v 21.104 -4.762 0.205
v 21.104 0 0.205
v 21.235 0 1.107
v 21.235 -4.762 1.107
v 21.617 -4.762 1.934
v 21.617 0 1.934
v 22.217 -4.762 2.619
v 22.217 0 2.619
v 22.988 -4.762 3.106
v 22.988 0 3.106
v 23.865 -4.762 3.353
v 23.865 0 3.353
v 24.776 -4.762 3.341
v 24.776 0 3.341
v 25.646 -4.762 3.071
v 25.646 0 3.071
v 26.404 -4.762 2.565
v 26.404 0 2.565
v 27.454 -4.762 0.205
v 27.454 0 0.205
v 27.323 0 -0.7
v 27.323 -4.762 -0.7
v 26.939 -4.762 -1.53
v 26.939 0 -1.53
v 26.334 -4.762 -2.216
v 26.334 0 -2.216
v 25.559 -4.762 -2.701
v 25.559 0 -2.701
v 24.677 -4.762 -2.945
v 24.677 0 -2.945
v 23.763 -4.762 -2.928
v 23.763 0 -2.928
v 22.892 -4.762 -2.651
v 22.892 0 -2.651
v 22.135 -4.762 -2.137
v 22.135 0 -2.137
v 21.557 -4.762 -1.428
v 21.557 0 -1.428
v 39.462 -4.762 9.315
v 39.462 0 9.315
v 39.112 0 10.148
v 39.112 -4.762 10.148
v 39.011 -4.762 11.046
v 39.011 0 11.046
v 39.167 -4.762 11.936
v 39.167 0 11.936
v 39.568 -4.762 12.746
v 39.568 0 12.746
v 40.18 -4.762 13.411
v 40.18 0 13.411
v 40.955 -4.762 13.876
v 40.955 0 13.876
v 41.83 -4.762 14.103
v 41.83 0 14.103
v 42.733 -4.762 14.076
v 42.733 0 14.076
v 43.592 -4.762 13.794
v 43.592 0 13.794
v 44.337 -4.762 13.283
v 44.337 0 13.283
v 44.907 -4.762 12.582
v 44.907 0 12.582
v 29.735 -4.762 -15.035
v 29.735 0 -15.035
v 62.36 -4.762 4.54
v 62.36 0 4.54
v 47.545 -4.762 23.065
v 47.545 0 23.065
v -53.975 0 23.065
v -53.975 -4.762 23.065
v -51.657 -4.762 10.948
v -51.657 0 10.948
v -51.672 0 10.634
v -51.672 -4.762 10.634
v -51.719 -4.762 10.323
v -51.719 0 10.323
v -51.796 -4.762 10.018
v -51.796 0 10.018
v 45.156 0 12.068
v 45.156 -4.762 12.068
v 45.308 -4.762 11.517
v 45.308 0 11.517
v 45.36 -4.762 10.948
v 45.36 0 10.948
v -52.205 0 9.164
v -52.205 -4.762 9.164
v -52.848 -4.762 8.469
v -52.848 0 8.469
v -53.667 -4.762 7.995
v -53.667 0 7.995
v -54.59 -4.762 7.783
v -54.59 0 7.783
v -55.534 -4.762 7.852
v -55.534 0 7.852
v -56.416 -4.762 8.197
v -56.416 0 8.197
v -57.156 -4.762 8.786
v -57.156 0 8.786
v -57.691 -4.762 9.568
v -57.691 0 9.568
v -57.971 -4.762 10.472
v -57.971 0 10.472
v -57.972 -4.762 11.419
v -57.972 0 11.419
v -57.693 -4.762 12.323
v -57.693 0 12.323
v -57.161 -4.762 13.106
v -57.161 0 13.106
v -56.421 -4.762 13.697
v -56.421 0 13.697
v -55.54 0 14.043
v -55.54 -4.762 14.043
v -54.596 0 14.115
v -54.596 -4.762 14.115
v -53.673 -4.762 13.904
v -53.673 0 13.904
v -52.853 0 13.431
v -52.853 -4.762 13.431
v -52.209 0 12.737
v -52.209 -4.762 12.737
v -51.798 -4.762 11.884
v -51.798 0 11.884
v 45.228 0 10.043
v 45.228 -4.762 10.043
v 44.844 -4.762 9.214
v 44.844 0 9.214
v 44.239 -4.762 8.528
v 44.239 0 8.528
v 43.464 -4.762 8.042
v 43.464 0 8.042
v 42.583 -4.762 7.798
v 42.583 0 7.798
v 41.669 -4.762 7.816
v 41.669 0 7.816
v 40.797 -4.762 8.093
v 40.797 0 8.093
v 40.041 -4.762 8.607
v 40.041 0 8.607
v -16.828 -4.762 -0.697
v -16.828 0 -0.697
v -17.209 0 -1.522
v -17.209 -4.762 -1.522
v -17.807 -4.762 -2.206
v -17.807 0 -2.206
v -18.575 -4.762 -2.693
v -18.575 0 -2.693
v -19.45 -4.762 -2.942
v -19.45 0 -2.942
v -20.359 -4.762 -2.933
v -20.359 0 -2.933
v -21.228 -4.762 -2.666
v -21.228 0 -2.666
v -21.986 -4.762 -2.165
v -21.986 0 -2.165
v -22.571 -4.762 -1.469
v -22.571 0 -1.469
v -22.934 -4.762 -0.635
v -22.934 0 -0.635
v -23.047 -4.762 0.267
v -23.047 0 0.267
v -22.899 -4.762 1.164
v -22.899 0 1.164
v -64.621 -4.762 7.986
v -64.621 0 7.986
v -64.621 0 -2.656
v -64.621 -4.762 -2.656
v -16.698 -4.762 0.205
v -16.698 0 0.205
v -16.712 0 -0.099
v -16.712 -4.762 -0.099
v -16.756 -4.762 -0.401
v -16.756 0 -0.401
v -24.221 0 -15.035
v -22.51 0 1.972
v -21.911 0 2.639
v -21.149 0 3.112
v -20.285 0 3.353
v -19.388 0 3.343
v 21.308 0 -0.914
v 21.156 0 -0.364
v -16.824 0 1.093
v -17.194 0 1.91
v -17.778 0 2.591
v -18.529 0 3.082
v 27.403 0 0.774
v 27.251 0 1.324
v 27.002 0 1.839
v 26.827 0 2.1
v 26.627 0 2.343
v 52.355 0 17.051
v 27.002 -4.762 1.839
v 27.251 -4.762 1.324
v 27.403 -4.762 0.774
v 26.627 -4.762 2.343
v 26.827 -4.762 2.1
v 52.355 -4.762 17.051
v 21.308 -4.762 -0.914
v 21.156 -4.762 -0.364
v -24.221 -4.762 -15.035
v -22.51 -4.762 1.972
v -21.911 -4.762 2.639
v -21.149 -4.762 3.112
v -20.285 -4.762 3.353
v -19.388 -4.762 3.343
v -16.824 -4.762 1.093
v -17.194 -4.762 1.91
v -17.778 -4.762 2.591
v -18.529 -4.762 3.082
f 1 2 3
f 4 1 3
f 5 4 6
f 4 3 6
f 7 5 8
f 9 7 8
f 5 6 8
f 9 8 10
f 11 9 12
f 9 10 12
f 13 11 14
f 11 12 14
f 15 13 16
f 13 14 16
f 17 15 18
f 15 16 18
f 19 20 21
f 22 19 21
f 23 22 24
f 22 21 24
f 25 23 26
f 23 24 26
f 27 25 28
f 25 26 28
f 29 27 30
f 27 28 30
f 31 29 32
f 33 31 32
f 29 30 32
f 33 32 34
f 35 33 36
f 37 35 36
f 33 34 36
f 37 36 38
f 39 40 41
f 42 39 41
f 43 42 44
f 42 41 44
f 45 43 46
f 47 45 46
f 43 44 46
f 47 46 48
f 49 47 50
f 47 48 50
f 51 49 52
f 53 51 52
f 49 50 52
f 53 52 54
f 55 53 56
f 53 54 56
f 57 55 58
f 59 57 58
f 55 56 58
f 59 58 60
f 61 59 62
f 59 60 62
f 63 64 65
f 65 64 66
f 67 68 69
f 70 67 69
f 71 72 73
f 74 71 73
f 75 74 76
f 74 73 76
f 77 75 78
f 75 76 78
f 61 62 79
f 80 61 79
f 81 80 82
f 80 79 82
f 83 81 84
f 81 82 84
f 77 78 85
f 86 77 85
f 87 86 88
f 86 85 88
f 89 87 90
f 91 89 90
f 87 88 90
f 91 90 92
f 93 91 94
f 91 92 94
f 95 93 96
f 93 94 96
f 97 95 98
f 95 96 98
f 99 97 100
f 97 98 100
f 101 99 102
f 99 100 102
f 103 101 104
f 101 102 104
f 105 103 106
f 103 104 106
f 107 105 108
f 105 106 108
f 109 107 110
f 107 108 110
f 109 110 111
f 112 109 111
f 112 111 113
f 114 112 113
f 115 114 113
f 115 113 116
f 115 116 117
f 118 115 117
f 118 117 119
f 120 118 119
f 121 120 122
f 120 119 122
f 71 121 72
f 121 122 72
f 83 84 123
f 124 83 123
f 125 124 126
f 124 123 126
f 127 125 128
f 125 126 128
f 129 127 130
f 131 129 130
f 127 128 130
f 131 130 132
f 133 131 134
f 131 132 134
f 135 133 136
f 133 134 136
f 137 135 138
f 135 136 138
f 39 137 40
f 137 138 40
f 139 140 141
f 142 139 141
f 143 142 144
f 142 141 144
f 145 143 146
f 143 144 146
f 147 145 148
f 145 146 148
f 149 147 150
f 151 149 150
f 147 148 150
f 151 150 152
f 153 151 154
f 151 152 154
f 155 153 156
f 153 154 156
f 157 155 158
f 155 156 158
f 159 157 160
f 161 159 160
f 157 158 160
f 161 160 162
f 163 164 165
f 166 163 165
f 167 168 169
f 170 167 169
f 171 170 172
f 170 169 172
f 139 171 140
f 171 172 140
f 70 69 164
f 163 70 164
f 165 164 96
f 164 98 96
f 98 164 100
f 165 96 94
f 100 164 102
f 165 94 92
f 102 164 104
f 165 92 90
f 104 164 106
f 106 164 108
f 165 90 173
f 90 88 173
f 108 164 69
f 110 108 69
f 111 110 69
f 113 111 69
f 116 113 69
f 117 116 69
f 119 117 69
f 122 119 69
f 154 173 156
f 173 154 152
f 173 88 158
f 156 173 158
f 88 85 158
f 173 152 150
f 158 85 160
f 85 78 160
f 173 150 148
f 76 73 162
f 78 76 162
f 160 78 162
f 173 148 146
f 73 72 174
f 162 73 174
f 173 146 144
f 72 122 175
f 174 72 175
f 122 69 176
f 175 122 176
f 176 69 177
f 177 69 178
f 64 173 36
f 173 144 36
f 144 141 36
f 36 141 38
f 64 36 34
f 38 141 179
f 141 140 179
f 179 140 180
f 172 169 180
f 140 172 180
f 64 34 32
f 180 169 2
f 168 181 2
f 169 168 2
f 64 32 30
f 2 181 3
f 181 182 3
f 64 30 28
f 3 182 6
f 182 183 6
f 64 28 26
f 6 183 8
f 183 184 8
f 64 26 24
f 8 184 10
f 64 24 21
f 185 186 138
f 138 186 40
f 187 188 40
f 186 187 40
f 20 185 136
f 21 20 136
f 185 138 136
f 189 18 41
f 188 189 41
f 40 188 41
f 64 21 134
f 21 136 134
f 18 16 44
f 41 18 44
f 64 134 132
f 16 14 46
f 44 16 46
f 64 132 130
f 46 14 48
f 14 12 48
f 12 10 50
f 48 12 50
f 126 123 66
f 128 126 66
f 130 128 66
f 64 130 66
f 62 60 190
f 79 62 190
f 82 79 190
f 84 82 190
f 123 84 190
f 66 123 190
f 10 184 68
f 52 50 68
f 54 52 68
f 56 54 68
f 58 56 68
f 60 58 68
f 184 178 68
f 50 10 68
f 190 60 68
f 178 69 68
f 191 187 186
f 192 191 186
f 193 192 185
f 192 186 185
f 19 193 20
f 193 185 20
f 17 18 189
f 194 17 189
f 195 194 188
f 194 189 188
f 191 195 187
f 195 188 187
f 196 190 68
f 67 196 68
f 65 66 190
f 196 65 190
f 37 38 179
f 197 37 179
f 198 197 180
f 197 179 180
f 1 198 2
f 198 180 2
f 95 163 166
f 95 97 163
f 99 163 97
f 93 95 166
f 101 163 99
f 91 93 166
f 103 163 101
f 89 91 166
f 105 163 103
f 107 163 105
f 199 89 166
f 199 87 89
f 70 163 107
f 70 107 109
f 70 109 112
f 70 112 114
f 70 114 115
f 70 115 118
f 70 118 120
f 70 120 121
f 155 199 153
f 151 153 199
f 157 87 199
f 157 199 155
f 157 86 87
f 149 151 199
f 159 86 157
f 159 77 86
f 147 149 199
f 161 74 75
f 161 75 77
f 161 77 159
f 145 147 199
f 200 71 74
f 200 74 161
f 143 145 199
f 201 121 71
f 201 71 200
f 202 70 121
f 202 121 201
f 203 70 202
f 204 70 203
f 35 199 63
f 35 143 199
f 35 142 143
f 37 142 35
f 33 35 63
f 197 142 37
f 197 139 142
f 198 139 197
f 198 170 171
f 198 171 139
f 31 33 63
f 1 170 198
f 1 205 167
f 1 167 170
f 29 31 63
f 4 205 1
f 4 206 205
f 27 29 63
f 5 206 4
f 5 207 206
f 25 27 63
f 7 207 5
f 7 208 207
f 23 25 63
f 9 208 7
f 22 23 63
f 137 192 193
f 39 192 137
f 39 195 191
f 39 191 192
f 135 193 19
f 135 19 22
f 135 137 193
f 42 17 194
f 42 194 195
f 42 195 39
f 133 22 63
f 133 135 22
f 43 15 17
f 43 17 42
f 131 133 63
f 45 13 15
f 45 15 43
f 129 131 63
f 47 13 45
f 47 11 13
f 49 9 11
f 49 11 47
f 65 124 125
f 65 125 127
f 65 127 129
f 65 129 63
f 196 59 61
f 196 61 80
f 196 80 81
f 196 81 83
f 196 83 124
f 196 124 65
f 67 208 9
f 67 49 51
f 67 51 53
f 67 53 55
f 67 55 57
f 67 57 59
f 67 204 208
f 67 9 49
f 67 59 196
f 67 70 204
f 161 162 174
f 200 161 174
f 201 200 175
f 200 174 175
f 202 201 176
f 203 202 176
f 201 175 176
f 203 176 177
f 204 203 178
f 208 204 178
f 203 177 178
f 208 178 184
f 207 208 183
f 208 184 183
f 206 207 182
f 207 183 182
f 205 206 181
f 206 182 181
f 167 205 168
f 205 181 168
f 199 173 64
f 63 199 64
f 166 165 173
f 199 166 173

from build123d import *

# Parameters (mm, degrees)
F1_DEPTH = 4.7625


with BuildPart() as f1:
    # F0 (on Front) → F1 (new body)
    with BuildSketch(Plane.XZ):
        with BuildLine():
            Line((26.4038386983, 2.564510672), (44.8625854758, 23.0650258511))
            Line((44.8625854758, 23.0650258511), (-53.9749003947, 23.0650258511))
            Line((-53.9749003947, 23.0650258511), (-64.6206509769, 7.9856580123))
            Line((-64.6206509769, 7.9856580123), (-64.6206509769, -2.6557157676))
            Line((-64.6206509769, -2.6557157676), (-24.221339656, -15.0349741489))
            Line((-24.221339656, -15.0349741489), (-1.1206509769, -15.0349741489))
            Line((-1.1206509769, -15.0349741489), (-1.1206509769, -5.5099741489))
            Line((-1.1206509769, -5.5099741489), (-16.828311902, -0.6967932604))
            ThreePointArc((-16.828311902, -0.6967932604), (-20.8027443302, -2.8306539415), (-22.8994068913, 1.1635269053))
            ThreePointArc((-22.8994068913, 1.1635269053), (-19.3876033028, 3.3427731008), (-16.6975437083, 0.2050258511))
            Line((-16.6975437083, 0.2050258511), (-0.8225437083, 0.2050258511))
            Line((-0.8225437083, 0.2050258511), (21.1043490231, 0.2050258511))
            ThreePointArc((21.1043490231, 0.2050258511), (22.9879601813, 3.1055326791), (26.4038386983, 2.564510672))
        make_face()
        with BuildLine():
            ThreePointArc((-51.6566210989, 10.9482761359), (-51.6916443202, 10.4779881079), (-51.7959413063, 10.018075514))
            ThreePointArc((-51.7959413063, 10.018075514), (-57.9715978776, 11.4185641639), (-51.6566210989, 10.9482761359))
        make_face(mode=Mode.SUBTRACT)
        with BuildLine():
            ThreePointArc((21.556808984, -1.4284981724), (21.219554126, -0.6424882714), (21.1043490231, 0.2050258511))
            Line((21.1043490231, 0.2050258511), (-0.8225437083, 0.2050258511))
            Line((-0.8225437083, 0.2050258511), (-16.6975437083, 0.2050258511))
            ThreePointArc((-16.6975437083, 0.2050258511), (-16.7304058226, -0.2505995516), (-16.828311902, -0.6967932604))
            Line((-16.828311902, -0.6967932604), (-1.1206509769, -5.5099741489))
            Line((-1.1206509769, -5.5099741489), (9.3876935245, -8.7299674481))
            Line((9.3876935245, -8.7299674481), (21.556808984, -1.4284981724))
        make_face()
        with BuildLine():
            Line((52.3552192636, 17.0505479954), (47.5451759994, 23.0650258511))
            Line((47.5451759994, 23.0650258511), (44.8625854758, 23.0650258511))
            Line((44.8625854758, 23.0650258511), (26.4038386983, 2.564510672))
            ThreePointArc((26.4038386983, 2.564510672), (26.7298957035, 2.2237992329), (27.0018890622, 1.8385498746))
            Line((27.0018890622, 1.8385498746), (39.4622261253, 9.3147521124))
            ThreePointArc((39.4622261253, 9.3147521124), (40.551242141, 13.670816175), (44.9073062036, 12.5818001594))
            Line((44.9073062036, 12.5818001594), (52.3552192636, 17.0505479954))
        make_face()
        Polygon((-1.1206509769, -5.5099741489), (-1.1206509769, -15.0349741489), (9.3876935245, -8.7299674481), align=None)
        with BuildLine():
            Line((62.3602304878, 4.5402824637), (52.3552192636, 17.0505479954))
            Line((52.3552192636, 17.0505479954), (44.9073062036, 12.5818001594))
            ThreePointArc((44.9073062036, 12.5818001594), (45.2445610615, 11.7957902584), (45.3597661644, 10.9482761359))
            ThreePointArc((45.3597661644, 10.9482761359), (43.032280287, 7.8884812388), (39.4622261253, 9.3147521124))
            Line((39.4622261253, 9.3147521124), (27.0018890622, 1.8385498746))
            ThreePointArc((27.0018890622, 1.8385498746), (27.3391439202, 1.0525399736), (27.4543490231, 0.2050258511))
            ThreePointArc((27.4543490231, 0.2050258511), (25.1268631456, -2.854769046), (21.556808984, -1.4284981724))
            Line((21.556808984, -1.4284981724), (9.3876935245, -8.7299674481))
            Line((9.3876935245, -8.7299674481), (-1.1206509769, -15.0349741489))
            Line((-1.1206509769, -15.0349741489), (29.7348028, -15.0349741489))
            Line((29.7348028, -15.0349741489), (62.3602304878, 4.5402824637))
        make_face()
    extrude(amount=F1_DEPTH)


solid = f1.part
